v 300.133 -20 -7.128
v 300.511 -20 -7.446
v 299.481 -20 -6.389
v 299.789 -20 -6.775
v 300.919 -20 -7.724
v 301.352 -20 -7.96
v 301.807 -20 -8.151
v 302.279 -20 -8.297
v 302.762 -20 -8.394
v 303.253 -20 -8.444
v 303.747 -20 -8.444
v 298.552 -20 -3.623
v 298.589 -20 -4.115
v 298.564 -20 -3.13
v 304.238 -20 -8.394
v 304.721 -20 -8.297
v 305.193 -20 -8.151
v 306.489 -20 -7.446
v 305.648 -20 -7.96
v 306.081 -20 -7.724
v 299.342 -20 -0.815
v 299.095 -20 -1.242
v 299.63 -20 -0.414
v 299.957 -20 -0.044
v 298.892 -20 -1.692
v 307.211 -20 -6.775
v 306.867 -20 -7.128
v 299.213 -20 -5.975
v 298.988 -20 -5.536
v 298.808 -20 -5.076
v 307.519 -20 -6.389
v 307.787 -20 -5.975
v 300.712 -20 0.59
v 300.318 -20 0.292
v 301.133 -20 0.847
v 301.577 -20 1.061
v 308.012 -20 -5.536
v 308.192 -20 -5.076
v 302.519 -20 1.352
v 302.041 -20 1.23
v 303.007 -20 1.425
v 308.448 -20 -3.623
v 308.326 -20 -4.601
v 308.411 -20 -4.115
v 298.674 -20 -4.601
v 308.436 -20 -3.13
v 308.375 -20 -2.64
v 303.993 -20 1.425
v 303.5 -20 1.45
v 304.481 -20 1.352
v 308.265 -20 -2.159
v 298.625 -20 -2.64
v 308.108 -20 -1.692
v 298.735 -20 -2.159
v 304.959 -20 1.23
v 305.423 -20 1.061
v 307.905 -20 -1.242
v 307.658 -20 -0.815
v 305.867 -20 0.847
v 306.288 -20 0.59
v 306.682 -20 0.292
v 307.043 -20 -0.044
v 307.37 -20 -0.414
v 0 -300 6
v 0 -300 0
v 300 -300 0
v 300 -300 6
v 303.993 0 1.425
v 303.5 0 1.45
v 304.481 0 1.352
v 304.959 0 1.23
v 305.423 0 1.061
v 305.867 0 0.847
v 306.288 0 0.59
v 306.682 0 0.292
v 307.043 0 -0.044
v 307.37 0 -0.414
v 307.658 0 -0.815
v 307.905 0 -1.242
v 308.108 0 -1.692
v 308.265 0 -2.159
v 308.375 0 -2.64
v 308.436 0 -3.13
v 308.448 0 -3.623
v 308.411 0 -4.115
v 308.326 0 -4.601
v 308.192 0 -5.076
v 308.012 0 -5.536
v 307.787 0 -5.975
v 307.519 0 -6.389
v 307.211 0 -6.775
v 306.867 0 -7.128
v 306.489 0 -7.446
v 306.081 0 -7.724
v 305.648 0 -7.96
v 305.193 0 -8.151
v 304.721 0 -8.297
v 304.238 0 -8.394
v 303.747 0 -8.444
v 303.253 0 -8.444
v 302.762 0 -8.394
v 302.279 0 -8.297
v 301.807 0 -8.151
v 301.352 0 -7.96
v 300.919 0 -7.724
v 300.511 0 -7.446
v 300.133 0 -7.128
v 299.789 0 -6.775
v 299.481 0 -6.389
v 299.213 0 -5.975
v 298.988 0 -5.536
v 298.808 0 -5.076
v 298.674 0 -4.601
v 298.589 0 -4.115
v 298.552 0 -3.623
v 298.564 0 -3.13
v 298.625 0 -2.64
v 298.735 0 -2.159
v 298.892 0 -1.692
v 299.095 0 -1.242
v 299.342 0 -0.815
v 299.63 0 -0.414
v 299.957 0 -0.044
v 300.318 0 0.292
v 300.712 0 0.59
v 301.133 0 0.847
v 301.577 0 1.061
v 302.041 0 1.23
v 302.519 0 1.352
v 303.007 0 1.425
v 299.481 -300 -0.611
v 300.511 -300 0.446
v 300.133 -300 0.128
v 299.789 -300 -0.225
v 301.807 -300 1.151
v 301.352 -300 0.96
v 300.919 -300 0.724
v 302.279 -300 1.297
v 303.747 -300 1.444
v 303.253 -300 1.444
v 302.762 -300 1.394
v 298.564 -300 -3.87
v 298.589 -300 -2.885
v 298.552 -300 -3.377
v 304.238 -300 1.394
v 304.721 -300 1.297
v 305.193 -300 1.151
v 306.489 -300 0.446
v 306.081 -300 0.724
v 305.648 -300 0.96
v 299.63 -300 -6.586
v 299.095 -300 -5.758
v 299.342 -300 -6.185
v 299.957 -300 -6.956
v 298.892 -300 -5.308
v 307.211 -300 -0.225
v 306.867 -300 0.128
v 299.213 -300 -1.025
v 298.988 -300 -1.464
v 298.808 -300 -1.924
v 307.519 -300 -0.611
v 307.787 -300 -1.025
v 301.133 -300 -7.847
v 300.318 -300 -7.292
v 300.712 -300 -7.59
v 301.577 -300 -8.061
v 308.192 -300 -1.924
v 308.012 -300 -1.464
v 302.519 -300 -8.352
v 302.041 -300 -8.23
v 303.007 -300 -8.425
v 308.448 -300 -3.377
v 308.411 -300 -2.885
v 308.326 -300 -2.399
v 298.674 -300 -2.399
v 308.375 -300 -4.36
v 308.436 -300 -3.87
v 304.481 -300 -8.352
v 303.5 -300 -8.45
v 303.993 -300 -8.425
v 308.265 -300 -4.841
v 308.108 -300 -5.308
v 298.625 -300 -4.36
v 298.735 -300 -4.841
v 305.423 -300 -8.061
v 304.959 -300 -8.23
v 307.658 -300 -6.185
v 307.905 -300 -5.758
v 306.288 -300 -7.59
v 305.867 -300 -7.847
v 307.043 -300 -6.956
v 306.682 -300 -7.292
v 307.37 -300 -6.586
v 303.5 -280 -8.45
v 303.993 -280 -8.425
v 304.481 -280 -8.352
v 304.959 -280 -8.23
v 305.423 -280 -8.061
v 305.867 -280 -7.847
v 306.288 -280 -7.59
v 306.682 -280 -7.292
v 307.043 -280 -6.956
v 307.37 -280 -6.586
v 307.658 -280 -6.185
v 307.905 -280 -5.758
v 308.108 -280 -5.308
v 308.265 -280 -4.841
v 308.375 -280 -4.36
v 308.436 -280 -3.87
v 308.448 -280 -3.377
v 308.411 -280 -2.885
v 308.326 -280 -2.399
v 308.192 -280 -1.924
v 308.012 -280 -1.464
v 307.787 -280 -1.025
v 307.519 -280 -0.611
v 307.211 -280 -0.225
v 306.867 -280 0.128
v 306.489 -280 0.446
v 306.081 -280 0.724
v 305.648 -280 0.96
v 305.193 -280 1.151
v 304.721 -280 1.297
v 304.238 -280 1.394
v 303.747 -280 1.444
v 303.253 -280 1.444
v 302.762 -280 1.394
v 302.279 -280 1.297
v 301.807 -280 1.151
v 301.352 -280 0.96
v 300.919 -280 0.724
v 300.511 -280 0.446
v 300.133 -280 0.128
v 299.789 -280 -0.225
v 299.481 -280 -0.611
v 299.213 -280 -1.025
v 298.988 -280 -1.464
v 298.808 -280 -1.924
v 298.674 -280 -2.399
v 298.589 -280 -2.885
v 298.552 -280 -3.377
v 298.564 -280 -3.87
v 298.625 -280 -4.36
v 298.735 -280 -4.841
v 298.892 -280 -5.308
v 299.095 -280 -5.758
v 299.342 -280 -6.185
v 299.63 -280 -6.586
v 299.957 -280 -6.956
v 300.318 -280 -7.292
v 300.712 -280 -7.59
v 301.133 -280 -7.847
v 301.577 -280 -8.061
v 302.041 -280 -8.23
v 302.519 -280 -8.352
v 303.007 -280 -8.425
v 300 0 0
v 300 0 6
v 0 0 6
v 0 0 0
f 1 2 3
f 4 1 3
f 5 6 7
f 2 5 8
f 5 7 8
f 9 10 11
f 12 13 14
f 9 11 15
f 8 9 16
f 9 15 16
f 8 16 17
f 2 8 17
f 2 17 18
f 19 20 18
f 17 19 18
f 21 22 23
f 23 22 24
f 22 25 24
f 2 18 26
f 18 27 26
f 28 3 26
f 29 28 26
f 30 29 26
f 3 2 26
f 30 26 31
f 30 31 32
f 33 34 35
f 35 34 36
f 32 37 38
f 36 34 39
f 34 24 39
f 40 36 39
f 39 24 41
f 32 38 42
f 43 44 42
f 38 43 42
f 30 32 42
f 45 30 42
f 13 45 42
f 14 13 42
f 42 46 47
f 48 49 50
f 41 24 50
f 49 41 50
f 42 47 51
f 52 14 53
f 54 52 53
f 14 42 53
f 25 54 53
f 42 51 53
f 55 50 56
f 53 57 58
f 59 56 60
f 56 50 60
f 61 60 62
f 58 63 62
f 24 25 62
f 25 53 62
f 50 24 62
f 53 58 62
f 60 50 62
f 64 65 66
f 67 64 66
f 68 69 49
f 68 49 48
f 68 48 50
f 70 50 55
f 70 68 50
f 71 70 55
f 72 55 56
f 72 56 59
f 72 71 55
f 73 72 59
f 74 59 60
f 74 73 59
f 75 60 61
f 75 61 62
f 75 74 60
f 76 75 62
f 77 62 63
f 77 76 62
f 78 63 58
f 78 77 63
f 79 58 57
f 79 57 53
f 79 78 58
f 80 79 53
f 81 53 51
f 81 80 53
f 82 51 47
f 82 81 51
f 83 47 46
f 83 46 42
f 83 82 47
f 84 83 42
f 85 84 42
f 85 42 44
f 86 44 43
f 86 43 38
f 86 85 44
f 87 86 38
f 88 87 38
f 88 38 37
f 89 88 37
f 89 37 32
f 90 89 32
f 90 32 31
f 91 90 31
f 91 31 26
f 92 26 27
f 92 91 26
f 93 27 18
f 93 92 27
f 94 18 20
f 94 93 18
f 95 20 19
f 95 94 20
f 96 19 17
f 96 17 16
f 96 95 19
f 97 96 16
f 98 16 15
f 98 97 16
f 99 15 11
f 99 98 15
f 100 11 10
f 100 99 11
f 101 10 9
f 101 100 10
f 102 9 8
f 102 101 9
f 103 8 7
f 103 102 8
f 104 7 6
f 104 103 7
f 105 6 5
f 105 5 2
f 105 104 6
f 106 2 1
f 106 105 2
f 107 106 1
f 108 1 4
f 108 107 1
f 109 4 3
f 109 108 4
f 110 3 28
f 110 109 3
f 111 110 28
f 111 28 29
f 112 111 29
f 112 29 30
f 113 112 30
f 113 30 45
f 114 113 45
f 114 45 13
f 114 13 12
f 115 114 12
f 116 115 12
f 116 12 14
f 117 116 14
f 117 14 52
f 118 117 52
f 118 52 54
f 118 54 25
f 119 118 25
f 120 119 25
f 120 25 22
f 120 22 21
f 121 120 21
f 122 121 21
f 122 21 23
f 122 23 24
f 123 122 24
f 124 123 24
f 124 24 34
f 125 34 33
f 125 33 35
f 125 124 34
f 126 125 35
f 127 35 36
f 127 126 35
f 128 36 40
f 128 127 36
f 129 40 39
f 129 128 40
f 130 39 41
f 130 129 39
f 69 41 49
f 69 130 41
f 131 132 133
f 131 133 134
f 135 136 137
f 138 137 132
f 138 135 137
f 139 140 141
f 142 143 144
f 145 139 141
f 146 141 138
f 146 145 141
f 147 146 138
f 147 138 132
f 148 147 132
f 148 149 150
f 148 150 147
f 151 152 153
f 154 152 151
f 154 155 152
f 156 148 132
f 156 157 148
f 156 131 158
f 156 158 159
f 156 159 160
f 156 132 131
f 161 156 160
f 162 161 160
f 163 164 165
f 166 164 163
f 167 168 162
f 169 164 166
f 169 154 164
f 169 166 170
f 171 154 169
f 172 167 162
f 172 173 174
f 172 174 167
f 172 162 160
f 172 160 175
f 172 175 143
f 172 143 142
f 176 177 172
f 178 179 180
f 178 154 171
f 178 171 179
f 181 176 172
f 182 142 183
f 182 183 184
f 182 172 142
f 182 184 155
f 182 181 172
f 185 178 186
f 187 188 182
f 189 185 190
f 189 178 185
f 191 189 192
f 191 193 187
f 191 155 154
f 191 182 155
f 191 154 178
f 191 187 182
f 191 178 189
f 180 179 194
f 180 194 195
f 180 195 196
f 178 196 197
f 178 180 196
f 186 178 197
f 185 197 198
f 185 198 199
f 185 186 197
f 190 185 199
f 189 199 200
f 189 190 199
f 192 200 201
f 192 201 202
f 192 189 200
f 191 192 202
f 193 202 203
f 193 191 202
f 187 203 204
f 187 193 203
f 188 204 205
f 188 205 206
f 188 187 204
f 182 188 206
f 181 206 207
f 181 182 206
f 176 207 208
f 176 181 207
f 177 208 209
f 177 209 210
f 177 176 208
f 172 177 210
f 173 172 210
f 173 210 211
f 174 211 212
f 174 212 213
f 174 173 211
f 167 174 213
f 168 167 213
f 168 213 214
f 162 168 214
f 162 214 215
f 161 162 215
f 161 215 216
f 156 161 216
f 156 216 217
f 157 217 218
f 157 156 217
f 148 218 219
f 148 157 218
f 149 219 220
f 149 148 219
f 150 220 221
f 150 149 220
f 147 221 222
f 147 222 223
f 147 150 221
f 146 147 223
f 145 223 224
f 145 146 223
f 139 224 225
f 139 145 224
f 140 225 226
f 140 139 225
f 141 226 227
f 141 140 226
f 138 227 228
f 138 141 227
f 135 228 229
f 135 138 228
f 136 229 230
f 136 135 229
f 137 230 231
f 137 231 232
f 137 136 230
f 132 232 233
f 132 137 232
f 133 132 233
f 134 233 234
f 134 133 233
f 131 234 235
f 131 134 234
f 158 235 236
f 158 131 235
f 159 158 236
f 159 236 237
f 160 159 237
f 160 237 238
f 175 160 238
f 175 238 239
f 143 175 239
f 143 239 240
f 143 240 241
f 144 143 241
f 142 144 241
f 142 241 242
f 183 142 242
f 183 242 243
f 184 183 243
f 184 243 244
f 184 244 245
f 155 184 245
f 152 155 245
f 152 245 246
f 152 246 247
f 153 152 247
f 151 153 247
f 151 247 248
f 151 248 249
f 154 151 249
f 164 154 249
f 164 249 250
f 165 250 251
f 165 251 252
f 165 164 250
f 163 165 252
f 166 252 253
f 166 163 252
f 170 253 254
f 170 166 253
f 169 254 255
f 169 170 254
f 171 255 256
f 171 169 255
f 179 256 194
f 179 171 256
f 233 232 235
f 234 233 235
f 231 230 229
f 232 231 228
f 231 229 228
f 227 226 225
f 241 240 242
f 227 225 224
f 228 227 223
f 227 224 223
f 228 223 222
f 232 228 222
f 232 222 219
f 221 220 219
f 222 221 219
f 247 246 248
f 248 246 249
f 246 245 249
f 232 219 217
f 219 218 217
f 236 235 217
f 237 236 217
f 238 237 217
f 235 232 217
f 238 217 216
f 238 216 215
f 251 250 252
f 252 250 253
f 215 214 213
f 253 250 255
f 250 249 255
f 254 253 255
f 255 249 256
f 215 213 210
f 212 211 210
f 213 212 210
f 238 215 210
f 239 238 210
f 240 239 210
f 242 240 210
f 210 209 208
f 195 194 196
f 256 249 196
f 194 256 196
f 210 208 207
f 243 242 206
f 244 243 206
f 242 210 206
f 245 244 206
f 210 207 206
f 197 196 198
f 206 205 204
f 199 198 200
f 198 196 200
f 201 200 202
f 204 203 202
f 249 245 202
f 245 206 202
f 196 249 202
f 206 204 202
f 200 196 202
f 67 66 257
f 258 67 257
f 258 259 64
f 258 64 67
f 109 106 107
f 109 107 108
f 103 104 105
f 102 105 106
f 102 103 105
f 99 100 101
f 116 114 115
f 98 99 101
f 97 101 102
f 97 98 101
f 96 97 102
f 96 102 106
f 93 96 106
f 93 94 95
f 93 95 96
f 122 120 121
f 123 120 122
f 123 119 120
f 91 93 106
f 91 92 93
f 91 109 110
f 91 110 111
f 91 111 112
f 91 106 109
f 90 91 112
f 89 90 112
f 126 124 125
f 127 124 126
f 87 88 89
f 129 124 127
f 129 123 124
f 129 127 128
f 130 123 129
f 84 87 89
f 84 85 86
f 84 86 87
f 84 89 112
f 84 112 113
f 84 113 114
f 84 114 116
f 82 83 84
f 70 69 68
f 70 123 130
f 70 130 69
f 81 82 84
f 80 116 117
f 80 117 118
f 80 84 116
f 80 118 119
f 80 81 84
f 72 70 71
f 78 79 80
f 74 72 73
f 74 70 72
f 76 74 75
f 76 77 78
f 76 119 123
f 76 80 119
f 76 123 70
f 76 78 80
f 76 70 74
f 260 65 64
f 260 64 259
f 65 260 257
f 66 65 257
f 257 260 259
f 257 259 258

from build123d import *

# Parameters (mm, degrees)
CROQUIS1_W              = 300
CROQUIS1_H              = 300
SALIENTE_EXTRUIR1_DEPTH = 6
CROQUIS2_R              = 4.949747468
SALIENTE_EXTRUIR2_DEPTH = 20
CROQUIS3_R              = 4.949747468
SALIENTE_EXTRUIR3_DEPTH = 20


with BuildPart() as part:
    # Croquis1 → Saliente-Extruir1 (new body)
    with BuildSketch(Plane.XY):
        with Locations((150, -150)):
            Rectangle(CROQUIS1_W, CROQUIS1_H)
    extrude(amount=SALIENTE_EXTRUIR1_DEPTH)


with BuildPart() as body_2:
    # Croquis2 → Saliente-Extruir2 (new body)
    with BuildSketch(Plane(origin=(0, 0, 0), x_dir=(1, 0, 0), z_dir=(0, 1, 0))):
        with Locations(Location((303.5, 3.5, 0), (0, 0, 270))):
            Circle(CROQUIS2_R)
    extrude(amount=-SALIENTE_EXTRUIR2_DEPTH)


with BuildPart() as body_3:
    # Croquis3 → Saliente-Extruir3 (new body)
    with BuildSketch(Plane.XZ.offset(300)):
        with Locations(Location((303.5, -3.5, 0), (0, 0, 270))):
            Circle(CROQUIS3_R)
    extrude(amount=-SALIENTE_EXTRUIR3_DEPTH)


solid = Compound([part.part, body_2.part, body_3.part])
